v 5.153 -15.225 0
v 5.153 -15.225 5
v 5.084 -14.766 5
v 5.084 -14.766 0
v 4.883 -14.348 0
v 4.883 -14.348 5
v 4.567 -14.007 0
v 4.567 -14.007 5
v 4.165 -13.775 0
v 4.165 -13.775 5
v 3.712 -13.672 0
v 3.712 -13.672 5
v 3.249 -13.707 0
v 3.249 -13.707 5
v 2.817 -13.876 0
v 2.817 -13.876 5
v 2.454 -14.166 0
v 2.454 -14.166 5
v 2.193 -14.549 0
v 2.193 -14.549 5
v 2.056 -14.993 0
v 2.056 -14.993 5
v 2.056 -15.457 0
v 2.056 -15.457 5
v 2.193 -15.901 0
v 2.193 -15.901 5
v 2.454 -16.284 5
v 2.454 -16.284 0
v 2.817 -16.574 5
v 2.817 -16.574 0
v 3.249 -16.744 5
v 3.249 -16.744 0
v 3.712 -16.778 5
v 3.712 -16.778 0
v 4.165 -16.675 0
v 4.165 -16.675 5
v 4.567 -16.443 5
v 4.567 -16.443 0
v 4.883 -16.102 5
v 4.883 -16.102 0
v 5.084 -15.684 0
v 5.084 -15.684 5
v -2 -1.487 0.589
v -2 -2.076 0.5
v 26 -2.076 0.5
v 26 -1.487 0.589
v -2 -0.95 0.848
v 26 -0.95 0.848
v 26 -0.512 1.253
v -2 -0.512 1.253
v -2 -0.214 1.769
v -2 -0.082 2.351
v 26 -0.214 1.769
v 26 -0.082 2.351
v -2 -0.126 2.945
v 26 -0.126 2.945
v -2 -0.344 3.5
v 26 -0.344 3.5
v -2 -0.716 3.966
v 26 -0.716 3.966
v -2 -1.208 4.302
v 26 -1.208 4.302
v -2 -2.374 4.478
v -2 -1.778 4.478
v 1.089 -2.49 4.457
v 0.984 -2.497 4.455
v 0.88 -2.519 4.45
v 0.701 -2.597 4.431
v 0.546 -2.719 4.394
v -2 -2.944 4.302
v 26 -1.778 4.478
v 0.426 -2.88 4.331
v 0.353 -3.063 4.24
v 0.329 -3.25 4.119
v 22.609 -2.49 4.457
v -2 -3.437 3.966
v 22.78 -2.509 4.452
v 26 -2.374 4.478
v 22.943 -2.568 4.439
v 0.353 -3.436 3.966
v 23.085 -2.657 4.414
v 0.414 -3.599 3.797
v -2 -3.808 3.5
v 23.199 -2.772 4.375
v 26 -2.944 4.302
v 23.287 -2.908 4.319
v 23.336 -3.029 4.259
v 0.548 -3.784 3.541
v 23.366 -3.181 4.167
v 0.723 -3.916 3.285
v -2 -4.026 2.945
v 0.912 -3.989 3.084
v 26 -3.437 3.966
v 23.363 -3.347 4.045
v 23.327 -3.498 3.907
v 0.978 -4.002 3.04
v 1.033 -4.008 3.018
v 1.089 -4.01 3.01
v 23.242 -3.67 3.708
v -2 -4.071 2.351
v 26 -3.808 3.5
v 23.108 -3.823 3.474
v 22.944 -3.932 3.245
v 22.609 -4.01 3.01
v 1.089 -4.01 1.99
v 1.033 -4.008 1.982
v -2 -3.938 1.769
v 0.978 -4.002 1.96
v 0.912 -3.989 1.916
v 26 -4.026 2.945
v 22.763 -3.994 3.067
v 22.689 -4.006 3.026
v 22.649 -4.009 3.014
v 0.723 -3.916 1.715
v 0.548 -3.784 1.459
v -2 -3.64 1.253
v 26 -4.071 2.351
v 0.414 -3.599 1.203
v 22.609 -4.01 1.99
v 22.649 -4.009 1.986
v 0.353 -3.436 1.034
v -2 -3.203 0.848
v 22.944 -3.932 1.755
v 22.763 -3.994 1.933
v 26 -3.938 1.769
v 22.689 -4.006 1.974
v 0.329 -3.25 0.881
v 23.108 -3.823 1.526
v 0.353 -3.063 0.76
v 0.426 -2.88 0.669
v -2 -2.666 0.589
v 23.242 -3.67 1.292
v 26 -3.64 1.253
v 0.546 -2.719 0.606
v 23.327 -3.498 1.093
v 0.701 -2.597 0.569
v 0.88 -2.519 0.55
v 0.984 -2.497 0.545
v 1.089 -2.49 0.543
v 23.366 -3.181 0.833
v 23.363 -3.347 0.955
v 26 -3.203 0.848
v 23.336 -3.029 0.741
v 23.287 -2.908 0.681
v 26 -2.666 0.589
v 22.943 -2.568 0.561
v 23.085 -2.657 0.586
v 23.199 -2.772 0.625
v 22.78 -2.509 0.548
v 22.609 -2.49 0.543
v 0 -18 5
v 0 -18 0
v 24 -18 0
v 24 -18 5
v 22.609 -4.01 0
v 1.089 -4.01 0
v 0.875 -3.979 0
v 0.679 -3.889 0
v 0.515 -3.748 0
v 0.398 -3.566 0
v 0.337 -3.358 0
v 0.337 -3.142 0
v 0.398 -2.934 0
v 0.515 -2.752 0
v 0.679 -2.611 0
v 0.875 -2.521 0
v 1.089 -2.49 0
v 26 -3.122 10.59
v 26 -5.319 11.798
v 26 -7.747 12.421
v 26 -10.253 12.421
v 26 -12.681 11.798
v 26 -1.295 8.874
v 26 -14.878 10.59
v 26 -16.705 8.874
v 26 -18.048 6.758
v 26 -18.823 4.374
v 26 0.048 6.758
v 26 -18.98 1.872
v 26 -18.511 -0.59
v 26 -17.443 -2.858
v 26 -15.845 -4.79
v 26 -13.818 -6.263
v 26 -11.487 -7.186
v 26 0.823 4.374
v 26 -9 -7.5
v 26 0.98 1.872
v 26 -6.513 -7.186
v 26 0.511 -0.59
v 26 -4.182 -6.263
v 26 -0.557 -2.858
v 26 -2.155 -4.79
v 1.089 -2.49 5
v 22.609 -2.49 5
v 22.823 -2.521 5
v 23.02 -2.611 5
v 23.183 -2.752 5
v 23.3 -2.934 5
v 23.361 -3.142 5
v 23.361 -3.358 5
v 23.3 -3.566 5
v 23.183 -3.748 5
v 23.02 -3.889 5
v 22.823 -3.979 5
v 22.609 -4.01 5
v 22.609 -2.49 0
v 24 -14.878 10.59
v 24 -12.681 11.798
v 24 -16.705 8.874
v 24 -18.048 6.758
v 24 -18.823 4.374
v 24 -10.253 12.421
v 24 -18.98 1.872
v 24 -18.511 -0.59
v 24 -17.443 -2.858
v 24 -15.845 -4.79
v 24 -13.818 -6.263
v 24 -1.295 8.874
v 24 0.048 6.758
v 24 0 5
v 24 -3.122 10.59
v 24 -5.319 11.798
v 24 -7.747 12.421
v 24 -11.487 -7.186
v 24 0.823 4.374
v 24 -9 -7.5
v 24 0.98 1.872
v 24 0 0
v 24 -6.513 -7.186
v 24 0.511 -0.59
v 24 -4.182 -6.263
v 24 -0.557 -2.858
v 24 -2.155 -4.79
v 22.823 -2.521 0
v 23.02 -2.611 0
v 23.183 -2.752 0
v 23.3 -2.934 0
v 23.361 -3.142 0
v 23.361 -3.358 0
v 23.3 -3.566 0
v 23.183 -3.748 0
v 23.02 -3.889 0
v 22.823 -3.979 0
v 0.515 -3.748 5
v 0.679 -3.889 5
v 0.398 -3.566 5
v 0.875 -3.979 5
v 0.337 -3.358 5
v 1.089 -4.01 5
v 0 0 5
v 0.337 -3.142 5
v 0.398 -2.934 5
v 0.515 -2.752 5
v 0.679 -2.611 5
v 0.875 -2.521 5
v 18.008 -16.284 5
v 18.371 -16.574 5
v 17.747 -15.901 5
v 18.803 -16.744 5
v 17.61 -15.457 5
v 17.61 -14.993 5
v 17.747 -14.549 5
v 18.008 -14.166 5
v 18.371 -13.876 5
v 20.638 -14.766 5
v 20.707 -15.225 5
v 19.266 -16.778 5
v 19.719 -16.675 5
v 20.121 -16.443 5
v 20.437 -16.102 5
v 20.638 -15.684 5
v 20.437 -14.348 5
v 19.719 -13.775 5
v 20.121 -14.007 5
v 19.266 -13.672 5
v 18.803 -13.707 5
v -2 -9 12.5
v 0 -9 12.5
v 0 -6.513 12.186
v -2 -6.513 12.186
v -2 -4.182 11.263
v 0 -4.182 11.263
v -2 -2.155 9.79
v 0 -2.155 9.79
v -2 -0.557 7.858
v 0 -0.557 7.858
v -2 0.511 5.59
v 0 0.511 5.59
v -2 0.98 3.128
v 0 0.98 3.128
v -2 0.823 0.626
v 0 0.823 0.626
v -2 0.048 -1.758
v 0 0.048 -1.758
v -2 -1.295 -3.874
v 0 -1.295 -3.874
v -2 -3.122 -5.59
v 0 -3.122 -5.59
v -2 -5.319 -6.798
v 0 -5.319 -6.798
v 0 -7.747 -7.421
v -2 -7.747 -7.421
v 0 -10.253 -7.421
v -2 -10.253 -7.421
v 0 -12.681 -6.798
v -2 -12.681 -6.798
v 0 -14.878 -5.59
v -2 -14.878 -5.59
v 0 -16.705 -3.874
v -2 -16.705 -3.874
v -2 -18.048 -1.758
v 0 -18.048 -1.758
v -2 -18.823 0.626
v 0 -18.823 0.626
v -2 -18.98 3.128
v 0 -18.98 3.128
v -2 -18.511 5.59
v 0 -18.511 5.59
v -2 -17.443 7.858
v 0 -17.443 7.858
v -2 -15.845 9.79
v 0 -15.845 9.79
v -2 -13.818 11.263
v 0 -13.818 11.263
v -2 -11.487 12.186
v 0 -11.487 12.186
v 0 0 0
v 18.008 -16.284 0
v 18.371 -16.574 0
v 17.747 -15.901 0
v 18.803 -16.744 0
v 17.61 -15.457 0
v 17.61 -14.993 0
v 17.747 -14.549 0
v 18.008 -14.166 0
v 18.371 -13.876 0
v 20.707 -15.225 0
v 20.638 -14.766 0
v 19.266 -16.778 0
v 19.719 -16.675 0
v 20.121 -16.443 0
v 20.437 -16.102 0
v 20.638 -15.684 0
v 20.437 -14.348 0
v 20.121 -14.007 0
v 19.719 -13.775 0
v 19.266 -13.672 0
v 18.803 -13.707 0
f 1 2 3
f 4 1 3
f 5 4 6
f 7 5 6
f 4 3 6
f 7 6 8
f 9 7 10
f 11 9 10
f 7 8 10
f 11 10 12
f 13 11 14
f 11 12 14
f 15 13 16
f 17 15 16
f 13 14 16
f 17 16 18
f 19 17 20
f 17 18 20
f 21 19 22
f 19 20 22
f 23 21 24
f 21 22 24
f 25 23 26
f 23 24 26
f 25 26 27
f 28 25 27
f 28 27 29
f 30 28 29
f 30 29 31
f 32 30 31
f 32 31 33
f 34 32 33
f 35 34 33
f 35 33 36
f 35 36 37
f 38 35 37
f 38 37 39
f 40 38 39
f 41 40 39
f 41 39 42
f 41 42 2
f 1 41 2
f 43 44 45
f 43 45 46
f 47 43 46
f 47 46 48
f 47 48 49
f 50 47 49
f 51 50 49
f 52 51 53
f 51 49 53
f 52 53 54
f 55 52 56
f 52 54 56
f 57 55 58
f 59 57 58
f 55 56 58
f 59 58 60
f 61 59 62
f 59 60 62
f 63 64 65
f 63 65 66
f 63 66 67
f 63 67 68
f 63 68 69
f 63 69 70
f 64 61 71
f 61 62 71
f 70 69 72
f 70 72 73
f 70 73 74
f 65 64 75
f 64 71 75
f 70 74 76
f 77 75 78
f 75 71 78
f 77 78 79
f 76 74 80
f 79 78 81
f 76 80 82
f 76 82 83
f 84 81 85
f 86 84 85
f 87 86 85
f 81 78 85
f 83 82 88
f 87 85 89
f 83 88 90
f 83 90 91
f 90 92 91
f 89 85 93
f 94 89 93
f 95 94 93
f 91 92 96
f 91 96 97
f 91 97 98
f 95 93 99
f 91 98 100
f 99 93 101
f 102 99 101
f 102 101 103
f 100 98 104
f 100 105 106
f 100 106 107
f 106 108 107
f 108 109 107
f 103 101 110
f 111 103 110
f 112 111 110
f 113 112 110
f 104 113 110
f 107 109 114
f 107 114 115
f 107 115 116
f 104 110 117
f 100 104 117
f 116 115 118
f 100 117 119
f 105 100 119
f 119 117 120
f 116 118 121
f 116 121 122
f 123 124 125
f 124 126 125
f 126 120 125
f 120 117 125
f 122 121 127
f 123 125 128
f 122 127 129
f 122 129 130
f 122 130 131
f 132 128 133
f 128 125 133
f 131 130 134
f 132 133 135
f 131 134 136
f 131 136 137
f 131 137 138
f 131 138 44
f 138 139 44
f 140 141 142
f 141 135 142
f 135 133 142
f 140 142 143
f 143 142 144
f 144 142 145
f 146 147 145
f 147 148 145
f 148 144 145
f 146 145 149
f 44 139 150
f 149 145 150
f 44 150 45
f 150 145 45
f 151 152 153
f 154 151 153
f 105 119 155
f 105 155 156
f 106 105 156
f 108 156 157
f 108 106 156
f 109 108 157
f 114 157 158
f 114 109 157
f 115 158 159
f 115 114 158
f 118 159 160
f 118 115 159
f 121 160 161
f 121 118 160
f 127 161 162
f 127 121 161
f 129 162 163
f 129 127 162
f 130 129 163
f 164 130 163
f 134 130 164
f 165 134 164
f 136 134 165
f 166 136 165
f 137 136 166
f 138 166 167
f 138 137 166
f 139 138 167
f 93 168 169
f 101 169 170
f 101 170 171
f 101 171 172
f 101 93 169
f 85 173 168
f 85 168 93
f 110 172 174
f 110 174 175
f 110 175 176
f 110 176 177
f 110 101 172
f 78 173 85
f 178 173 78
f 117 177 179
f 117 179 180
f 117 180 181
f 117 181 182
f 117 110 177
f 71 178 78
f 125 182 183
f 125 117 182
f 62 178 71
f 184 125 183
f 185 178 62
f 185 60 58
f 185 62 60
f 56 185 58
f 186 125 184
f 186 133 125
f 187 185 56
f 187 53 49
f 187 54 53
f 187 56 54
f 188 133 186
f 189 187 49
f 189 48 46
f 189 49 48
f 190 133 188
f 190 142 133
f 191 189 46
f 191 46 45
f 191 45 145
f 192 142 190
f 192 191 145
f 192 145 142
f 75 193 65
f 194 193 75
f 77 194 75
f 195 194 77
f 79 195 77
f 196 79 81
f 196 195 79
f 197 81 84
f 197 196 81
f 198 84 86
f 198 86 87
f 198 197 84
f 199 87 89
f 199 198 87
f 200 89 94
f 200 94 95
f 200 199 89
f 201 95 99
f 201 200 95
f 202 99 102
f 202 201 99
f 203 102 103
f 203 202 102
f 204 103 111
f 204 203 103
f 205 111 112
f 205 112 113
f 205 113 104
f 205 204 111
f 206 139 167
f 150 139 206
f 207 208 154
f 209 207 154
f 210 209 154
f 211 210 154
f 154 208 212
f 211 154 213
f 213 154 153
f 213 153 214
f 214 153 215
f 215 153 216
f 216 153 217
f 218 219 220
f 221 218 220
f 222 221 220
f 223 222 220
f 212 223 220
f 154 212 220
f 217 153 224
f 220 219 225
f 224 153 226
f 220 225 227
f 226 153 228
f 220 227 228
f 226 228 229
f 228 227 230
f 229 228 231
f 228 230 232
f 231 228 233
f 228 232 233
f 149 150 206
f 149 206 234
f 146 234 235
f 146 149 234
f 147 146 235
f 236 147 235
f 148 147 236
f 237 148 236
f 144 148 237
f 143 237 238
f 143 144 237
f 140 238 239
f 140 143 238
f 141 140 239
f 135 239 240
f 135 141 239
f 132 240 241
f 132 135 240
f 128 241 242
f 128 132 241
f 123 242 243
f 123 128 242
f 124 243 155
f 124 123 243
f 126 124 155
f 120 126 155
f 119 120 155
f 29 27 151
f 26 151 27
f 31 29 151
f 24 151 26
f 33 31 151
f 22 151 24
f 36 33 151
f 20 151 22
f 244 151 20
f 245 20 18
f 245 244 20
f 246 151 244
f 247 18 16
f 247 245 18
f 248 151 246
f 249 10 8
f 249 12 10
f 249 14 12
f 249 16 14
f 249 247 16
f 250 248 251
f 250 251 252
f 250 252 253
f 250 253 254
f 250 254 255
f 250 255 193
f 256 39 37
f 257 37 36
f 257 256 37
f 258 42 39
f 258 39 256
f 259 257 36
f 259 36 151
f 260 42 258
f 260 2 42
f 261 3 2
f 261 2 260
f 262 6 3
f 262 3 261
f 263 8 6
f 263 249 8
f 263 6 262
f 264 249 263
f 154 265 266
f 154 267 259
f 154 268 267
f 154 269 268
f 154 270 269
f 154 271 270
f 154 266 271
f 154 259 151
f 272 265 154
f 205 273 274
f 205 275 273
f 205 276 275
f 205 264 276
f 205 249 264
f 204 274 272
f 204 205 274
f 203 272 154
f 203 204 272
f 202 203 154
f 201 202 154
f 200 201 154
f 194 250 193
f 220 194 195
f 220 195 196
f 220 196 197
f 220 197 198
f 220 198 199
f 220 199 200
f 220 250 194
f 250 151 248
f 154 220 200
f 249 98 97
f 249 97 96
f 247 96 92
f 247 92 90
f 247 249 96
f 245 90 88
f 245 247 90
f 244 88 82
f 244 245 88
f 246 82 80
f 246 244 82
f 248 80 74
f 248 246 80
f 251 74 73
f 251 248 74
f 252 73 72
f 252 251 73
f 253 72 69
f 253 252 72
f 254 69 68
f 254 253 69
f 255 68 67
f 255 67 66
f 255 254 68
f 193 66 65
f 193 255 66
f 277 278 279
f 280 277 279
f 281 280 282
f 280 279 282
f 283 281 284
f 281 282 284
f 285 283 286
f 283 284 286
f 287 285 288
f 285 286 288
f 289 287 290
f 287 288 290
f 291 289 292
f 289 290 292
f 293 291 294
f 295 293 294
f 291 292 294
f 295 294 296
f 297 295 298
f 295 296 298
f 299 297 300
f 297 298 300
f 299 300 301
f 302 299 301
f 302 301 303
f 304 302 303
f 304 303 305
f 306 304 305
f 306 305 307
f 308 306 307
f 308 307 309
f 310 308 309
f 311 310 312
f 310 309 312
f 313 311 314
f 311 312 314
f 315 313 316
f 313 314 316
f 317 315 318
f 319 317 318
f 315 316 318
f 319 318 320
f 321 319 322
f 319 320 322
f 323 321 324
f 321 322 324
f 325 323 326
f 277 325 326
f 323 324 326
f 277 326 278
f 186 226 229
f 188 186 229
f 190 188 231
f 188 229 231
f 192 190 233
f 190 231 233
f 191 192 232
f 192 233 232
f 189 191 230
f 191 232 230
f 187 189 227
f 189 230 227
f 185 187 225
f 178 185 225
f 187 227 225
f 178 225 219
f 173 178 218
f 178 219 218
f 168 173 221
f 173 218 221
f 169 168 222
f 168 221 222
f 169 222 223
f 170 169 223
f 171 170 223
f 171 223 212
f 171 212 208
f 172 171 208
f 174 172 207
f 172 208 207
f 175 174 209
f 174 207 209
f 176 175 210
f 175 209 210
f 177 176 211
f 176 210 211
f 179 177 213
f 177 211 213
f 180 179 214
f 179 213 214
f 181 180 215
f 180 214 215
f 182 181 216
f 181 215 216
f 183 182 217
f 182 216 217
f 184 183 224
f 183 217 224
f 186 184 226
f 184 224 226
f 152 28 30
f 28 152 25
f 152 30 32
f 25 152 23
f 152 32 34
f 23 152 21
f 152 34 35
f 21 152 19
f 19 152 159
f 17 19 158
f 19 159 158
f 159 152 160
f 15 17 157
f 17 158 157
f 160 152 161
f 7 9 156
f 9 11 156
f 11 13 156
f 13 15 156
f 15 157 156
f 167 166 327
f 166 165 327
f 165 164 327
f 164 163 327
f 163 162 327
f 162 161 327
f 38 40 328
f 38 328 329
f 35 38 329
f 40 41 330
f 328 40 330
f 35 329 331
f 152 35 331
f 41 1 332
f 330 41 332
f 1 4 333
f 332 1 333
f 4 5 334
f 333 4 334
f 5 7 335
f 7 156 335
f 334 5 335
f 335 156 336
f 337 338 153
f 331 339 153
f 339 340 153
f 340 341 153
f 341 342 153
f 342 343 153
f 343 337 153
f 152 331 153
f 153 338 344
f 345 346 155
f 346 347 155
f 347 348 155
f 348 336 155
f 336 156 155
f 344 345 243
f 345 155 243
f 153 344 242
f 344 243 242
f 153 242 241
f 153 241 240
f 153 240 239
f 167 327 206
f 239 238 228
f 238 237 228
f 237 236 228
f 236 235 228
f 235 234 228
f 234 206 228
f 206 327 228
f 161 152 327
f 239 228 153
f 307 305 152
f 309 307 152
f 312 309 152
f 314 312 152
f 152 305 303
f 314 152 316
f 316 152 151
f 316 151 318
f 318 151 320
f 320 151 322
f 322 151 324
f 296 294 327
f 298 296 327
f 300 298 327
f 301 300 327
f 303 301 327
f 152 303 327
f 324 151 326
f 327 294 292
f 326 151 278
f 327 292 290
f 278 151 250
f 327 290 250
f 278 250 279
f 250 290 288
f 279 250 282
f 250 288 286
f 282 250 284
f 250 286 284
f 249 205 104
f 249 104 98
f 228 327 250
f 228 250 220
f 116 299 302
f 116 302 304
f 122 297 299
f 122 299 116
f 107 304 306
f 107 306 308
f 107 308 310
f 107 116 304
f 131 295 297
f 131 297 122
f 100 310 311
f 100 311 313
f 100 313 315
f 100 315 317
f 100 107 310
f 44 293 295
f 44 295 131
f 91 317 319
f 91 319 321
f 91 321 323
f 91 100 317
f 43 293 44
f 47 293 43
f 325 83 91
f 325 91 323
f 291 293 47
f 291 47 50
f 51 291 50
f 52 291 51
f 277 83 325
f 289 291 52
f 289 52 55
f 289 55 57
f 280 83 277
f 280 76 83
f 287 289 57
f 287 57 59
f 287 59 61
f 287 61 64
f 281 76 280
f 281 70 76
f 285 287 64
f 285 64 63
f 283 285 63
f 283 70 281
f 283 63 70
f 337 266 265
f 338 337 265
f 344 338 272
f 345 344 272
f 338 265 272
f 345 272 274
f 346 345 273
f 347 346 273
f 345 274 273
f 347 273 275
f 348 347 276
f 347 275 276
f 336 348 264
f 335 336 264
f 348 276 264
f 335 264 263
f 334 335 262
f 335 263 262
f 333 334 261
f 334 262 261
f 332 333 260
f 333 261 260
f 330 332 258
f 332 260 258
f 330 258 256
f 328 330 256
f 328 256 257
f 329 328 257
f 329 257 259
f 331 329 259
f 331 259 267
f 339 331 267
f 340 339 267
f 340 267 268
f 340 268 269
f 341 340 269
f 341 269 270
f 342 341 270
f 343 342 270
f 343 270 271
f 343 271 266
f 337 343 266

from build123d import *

# Parameters (mm, degrees)
SKETCH1_W           = 24
SKETCH1_H           = 18
BOSS_EXTRUDE1_DEPTH = 5
SKETCH3_R           = 1.5575
CUT_EXTRUDE1_DEPTH  = 6
CUT_EXTRUDE2_DEPTH  = 6
SKETCH5_R           = 10
BOSS_EXTRUDE3_DEPTH = 2
SKETCH6_R           = 10
BOSS_EXTRUDE4_DEPTH = 2
SKETCH7_R           = 2
CUT_EXTRUDE3_DEPTH  = 29


with BuildPart() as part:
    # Sketch1 → Boss-Extrude1 (new body)
    with BuildSketch(Plane.XY):
        with Locations((12, -9)):
            Rectangle(SKETCH1_W, SKETCH1_H)
    extrude(amount=BOSS_EXTRUDE1_DEPTH)

    # Sketch3 → Cut-Extrude1 (cut, through all)
    with BuildSketch(Plane.XY.offset(5)):
        with Locations((3.59586, -15.22505)):
            Circle(SKETCH3_R)
        with Locations((19.14986, -15.22505)):
            Circle(SKETCH3_R)
    extrude(amount=-CUT_EXTRUDE1_DEPTH, mode=Mode.SUBTRACT)

    # Sketch4 → Cut-Extrude2 (cut, through all)
    with BuildSketch(Plane.XY.offset(5)):
        with BuildLine():
            Line((1.089474394, -2.489991356), (22.608748961, -2.489991356))
            ThreePointArc((22.608748961, -2.489991356), (23.368757605, -3.25), (22.608748961, -4.010008644))
            Line((22.608748961, -4.010008644), (1.089474394, -4.010008644))
            ThreePointArc((1.089474394, -4.010008644), (0.32946575, -3.25), (1.089474394, -2.489991356))
        make_face()
    extrude(amount=-CUT_EXTRUDE2_DEPTH, mode=Mode.SUBTRACT)

    # Sketch5 → Boss-Extrude3 (add)
    with BuildSketch(Plane.ZY):
        with Locations((2.5, -9)):
            Circle(SKETCH5_R)
    extrude(amount=BOSS_EXTRUDE3_DEPTH)

    # Sketch6 → Boss-Extrude4 (add)
    with BuildSketch(Plane(origin=(24, 0, 0), x_dir=(0, 0, -1), z_dir=(1, 0, 0))):
        with Locations((-2.5, -9)):
            Circle(SKETCH6_R)
    extrude(amount=BOSS_EXTRUDE4_DEPTH)

    # Sketch7 → Cut-Extrude3 (cut, through all)
    with BuildSketch(Plane(origin=(26, 0, 0), x_dir=(0, 0, -1), z_dir=(1, 0, 0))):
        with Locations((-2.5, -2.07616)):
            Circle(SKETCH7_R)
    extrude(amount=-CUT_EXTRUDE3_DEPTH, mode=Mode.SUBTRACT)


solid = part.part
